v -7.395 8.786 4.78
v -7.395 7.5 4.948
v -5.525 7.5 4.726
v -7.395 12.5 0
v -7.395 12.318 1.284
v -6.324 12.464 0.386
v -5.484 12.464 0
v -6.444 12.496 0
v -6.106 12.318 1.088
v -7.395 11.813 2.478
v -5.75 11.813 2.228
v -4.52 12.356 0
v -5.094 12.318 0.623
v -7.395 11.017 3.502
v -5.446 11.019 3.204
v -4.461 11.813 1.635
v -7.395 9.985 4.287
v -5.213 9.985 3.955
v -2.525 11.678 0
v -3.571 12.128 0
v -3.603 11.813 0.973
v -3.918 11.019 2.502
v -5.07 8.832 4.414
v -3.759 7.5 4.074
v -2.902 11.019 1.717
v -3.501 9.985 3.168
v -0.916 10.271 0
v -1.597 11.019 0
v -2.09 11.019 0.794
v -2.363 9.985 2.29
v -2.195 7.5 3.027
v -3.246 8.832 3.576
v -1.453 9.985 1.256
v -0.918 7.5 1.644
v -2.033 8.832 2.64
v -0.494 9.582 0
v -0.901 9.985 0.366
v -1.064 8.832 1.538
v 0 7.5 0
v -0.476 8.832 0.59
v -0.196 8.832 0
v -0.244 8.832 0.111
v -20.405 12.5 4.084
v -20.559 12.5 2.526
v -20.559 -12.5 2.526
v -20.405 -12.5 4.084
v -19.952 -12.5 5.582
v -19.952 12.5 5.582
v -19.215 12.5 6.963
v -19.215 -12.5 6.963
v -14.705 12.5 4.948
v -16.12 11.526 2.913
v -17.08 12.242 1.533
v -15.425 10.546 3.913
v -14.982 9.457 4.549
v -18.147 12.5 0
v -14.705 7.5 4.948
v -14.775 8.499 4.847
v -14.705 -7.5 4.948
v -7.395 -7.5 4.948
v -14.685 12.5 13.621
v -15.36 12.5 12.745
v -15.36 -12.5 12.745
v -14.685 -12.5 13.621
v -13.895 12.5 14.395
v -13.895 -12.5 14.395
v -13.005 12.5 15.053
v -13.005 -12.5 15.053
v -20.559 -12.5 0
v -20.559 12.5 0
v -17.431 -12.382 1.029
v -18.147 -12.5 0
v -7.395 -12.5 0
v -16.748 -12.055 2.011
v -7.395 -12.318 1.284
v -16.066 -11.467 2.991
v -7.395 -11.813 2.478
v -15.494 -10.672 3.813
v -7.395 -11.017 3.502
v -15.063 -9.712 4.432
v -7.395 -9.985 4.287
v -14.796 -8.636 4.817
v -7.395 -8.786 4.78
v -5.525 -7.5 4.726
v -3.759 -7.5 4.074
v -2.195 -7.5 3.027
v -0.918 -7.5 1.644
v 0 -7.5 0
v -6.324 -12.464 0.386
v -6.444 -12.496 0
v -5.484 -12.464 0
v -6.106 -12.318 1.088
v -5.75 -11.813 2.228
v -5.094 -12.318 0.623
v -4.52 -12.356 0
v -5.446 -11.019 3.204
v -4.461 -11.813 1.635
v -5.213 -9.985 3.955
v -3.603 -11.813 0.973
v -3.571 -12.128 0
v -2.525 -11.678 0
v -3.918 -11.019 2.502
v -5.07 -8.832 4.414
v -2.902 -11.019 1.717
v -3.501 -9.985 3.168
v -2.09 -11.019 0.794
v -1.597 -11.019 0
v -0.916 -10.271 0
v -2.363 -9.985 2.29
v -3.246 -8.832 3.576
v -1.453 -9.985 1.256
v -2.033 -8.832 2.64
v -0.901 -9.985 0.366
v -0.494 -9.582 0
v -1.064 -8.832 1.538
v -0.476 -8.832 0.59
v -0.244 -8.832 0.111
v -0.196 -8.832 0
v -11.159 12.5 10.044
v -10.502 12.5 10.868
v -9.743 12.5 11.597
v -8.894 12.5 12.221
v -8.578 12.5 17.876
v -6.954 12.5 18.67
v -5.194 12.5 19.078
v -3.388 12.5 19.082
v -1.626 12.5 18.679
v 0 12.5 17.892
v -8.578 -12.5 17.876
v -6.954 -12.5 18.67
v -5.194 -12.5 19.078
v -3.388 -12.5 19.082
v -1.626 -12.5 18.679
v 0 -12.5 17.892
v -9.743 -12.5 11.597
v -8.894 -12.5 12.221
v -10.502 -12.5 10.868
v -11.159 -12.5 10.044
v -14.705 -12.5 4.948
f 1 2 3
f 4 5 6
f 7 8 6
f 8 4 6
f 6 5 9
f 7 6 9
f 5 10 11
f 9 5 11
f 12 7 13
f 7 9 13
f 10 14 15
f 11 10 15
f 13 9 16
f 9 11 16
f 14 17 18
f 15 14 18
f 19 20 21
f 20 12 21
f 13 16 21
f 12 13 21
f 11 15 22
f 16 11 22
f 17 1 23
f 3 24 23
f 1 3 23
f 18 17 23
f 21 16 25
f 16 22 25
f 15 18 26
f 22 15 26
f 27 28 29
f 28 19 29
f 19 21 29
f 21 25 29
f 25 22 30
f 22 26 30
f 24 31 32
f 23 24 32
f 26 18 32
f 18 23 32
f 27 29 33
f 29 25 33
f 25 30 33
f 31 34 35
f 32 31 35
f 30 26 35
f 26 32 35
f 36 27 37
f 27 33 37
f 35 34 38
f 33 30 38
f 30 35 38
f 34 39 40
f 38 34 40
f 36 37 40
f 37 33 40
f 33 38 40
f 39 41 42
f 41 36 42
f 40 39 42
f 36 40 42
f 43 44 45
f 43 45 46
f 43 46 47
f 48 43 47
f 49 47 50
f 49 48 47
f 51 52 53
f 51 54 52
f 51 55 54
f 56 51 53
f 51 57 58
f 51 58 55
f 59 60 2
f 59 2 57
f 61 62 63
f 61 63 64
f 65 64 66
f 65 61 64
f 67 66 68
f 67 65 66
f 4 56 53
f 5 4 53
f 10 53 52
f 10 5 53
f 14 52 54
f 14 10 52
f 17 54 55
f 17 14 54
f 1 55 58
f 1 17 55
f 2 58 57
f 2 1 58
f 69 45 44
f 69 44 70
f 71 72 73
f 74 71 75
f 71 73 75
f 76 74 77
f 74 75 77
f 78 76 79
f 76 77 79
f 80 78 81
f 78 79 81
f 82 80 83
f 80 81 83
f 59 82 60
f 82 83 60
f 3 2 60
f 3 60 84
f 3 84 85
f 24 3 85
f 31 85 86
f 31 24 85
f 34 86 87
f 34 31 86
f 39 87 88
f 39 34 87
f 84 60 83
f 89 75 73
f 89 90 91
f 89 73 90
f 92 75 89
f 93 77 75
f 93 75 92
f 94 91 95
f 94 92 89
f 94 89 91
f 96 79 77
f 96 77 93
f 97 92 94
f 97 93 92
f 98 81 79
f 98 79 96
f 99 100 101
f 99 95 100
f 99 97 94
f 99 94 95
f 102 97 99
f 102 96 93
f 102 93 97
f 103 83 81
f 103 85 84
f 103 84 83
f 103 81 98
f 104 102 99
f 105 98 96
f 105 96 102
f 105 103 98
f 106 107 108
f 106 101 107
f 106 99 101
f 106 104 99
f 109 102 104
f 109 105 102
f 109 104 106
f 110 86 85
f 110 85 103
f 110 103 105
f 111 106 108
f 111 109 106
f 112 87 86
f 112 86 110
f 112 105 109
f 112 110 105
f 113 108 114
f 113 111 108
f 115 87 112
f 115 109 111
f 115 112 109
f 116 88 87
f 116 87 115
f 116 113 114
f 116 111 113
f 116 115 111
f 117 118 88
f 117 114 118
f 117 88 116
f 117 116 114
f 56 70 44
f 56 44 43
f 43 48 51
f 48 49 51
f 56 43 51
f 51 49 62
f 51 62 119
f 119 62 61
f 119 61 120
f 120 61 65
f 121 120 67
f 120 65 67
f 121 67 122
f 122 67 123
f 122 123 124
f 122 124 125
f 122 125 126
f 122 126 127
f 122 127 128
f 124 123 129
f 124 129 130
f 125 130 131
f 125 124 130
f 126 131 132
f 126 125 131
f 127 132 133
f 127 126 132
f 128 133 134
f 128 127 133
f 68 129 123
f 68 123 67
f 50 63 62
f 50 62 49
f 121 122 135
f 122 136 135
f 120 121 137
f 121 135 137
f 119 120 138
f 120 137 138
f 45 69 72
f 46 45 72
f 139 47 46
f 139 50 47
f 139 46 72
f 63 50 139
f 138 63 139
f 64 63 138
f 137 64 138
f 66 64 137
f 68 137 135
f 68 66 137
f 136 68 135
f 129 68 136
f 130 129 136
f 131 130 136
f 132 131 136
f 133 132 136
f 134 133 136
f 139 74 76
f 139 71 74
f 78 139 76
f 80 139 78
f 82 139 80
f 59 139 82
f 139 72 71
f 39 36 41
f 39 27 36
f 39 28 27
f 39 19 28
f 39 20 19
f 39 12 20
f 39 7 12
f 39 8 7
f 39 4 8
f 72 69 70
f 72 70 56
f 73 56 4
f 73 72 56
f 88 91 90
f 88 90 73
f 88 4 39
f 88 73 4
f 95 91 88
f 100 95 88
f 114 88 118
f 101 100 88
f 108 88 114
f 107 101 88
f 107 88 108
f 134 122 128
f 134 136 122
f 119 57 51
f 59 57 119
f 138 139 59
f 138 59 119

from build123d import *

# Parameters (mm, degrees)
F1_DEPTH     = 12.5
F2_T1_DEPTH  = 75.8666564448
F2_T3_DEPTH  = 33.4238697913
F2_T5_DEPTH  = 37.1110249992
F2_T7_DEPTH  = 61.9747717196
F3_T2_ANGLE  = 157.1183672373
F3_T4_ANGLE  = 157.1183672373
F3_T8_DEPTH  = 19.8096921988
F3_T13_DEPTH = 19.8096921988
F4_R         = 8


# Not quite as in the source:
# - a fillet or chamfer that OpenCascade refuses, or shapes differently, is made with other operations: its cross-section is extruded or revolved along the edge and cut away or added


with BuildPart() as f1:
    # F0 (on Front) → F1 (new body, symmetric)
    with BuildSketch(Plane.XZ):
        Polygon((-20.558629185, 0), (0, 0), (0, 4.9480088055), (-14.7046465427, 4.9480088055), (-10.2444691584, 11.3595137373), (0, 17.8922185832), (0, 23.3462397009), (-14.4258858636, 14.1471242532), (-20.558629185, 4.9480088055), align=None)
    extrude(amount=F1_DEPTH, both=True)

    # F2: fillet of radius 8 on 4 edges, made by hand

    # F2_s2 → F2_t1 (cut)
    with BuildSketch(Plane.XZ.offset(-37.9333282224)):
        with BuildLine():
            ThreePointArc((-8.5777252412, 17.8763860282), (-4.2911639454, 19.1311087323), (0, 17.8922185832))
            Line((0, 17.8922185832), (0, 23.3462397009))
            Line((0, 23.3462397009), (-8.5777252412, 17.8763860282))
        make_face()
    extrude(amount=F2_T1_DEPTH, mode=Mode.SUBTRACT)

    # F2_s4 → F2_t3 (cut)
    with BuildSketch(Plane.XZ.offset(-16.7119348957)):
        with BuildLine():
            ThreePointArc((-15.3604302761, 12.7453075635), (-14.3030712709, 14.0217863385), (-13.0053552923, 15.0529698176))
            Line((-13.0053552923, 15.0529698176), (-14.4258858636, 14.1471242532))
            Line((-14.4258858636, 14.1471242532), (-15.3604302761, 12.7453075635))
        make_face()
    extrude(amount=F2_T3_DEPTH, mode=Mode.SUBTRACT)

    # F2_s6 → F2_t5 (cut)
    with BuildSketch(Plane.XZ.offset(-18.5555124996)):
        with BuildLine():
            ThreePointArc((-20.558629185, 2.5258038057), (-20.215365424, 4.8440769057), (-19.2150316433, 6.96340522))
            Line((-19.2150316433, 6.96340522), (-20.558629185, 4.9480088055))
            Line((-20.558629185, 4.9480088055), (-20.558629185, 2.5258038057))
        make_face()
    extrude(amount=F2_T5_DEPTH, mode=Mode.SUBTRACT)

    # F2_s8 → F2_t7 (cut)
    with BuildSketch(Plane.XZ.offset(-30.9873858598)):
        with BuildLine():
            ThreePointArc((-7.3949543439, 4.9480088055), (-2.9461303171, 3.5969158419), (0, 0))
            Line((0, 0), (0, 4.9480088055))
            Line((0, 4.9480088055), (-7.3949543439, 4.9480088055))
        make_face()
    extrude(amount=F2_T7_DEPTH, mode=Mode.SUBTRACT)

    # F3: fillet of radius 5 on 4 edges, made by hand

    # F3_s1 → F3_t2 (revolve, cut)
    with BuildSketch(Plane.YZ.offset(-7.3949543439)):
        with BuildLine():
            ThreePointArc((12.5, -0.0519911945), (11.0355339059, 3.4835427114), (7.5, 4.9480088055))
            Line((7.5, 4.9480088055), (12.5, 4.9480088055))
            Line((12.5, 4.9480088055), (12.5, -0.0519911945))
        make_face()
    revolve(axis=Axis((-7.3949543439, 12.5, -3.0519911944), (0, 1, 0)), revolution_arc=F3_T2_ANGLE, mode=Mode.SUBTRACT)

    # F3_s3 → F3_t4 (revolve, cut)
    with BuildSketch(Plane.YZ.offset(-7.3949543439)):
        with BuildLine():
            ThreePointArc((-12.5, -0.0519911945), (-11.0355339059, 3.4835427114), (-7.5, 4.9480088055))
            Line((-7.5, 4.9480088055), (-12.5, 4.9480088055))
            Line((-12.5, 4.9480088055), (-12.5, -0.0519911945))
        make_face()
    revolve(axis=Axis((-7.3949543439, -12.5, -3.0519911944), (0, 1, 0)), revolution_arc=F3_T4_ANGLE, mode=Mode.SUBTRACT)


with BuildPart() as f3_tool6:
    # F3_s7 → F3_t8 (new body)
    with BuildSketch(Plane.YZ.offset(-7.3949543439)):
        with BuildLine():
            ThreePointArc((-12.5, -0.0519911945), (-11.0355339059, 3.4835427114), (-7.5, 4.9480088055))
            Line((-7.5, 4.9480088055), (-12.5, 4.9480088055))
            Line((-12.5, 4.9480088055), (-12.5, -0.0519911945))
        make_face()
    extrude(amount=-F3_T8_DEPTH)

    split(bisect_by=Plane(origin=(-12.2288219378, 0, 8.5070066427), x_dir=(0, 1, 0), z_dir=(0.8209051994, 0, -0.5710644917)), keep=Keep.TOP)


with BuildPart() as f1_1:
    add(f1.part)

    # F3_t5: cut F3_tool6
    add(f3_tool6.part, mode=Mode.SUBTRACT)


with BuildPart() as f3_tool11:
    # F3_s12 → F3_t13 (new body)
    with BuildSketch(Plane.YZ.offset(-7.3949543439)):
        with BuildLine():
            ThreePointArc((12.5, -0.0519911945), (11.0355339059, 3.4835427114), (7.5, 4.9480088055))
            Line((7.5, 4.9480088055), (12.5, 4.9480088055))
            Line((12.5, 4.9480088055), (12.5, -0.0519911945))
        make_face()
    extrude(amount=-F3_T13_DEPTH)

    split(bisect_by=Plane(origin=(-12.2288219378, 0, 8.5070066427), x_dir=(0, 1, 0), z_dir=(0.8209051994, 0, -0.5710644917)), keep=Keep.TOP)


with BuildPart() as f1_2:
    add(f1_1.part)

    # F3_t10: cut F3_tool11
    add(f3_tool11.part, mode=Mode.SUBTRACT)

    # F4
    f4_edges = [f1_2.edges().sort_by_distance(p)[0] for p in [
        (-10.244469, 0, 11.359514),
    ]]
    fillet(f4_edges, radius=F4_R)


solid = f1_2.part
